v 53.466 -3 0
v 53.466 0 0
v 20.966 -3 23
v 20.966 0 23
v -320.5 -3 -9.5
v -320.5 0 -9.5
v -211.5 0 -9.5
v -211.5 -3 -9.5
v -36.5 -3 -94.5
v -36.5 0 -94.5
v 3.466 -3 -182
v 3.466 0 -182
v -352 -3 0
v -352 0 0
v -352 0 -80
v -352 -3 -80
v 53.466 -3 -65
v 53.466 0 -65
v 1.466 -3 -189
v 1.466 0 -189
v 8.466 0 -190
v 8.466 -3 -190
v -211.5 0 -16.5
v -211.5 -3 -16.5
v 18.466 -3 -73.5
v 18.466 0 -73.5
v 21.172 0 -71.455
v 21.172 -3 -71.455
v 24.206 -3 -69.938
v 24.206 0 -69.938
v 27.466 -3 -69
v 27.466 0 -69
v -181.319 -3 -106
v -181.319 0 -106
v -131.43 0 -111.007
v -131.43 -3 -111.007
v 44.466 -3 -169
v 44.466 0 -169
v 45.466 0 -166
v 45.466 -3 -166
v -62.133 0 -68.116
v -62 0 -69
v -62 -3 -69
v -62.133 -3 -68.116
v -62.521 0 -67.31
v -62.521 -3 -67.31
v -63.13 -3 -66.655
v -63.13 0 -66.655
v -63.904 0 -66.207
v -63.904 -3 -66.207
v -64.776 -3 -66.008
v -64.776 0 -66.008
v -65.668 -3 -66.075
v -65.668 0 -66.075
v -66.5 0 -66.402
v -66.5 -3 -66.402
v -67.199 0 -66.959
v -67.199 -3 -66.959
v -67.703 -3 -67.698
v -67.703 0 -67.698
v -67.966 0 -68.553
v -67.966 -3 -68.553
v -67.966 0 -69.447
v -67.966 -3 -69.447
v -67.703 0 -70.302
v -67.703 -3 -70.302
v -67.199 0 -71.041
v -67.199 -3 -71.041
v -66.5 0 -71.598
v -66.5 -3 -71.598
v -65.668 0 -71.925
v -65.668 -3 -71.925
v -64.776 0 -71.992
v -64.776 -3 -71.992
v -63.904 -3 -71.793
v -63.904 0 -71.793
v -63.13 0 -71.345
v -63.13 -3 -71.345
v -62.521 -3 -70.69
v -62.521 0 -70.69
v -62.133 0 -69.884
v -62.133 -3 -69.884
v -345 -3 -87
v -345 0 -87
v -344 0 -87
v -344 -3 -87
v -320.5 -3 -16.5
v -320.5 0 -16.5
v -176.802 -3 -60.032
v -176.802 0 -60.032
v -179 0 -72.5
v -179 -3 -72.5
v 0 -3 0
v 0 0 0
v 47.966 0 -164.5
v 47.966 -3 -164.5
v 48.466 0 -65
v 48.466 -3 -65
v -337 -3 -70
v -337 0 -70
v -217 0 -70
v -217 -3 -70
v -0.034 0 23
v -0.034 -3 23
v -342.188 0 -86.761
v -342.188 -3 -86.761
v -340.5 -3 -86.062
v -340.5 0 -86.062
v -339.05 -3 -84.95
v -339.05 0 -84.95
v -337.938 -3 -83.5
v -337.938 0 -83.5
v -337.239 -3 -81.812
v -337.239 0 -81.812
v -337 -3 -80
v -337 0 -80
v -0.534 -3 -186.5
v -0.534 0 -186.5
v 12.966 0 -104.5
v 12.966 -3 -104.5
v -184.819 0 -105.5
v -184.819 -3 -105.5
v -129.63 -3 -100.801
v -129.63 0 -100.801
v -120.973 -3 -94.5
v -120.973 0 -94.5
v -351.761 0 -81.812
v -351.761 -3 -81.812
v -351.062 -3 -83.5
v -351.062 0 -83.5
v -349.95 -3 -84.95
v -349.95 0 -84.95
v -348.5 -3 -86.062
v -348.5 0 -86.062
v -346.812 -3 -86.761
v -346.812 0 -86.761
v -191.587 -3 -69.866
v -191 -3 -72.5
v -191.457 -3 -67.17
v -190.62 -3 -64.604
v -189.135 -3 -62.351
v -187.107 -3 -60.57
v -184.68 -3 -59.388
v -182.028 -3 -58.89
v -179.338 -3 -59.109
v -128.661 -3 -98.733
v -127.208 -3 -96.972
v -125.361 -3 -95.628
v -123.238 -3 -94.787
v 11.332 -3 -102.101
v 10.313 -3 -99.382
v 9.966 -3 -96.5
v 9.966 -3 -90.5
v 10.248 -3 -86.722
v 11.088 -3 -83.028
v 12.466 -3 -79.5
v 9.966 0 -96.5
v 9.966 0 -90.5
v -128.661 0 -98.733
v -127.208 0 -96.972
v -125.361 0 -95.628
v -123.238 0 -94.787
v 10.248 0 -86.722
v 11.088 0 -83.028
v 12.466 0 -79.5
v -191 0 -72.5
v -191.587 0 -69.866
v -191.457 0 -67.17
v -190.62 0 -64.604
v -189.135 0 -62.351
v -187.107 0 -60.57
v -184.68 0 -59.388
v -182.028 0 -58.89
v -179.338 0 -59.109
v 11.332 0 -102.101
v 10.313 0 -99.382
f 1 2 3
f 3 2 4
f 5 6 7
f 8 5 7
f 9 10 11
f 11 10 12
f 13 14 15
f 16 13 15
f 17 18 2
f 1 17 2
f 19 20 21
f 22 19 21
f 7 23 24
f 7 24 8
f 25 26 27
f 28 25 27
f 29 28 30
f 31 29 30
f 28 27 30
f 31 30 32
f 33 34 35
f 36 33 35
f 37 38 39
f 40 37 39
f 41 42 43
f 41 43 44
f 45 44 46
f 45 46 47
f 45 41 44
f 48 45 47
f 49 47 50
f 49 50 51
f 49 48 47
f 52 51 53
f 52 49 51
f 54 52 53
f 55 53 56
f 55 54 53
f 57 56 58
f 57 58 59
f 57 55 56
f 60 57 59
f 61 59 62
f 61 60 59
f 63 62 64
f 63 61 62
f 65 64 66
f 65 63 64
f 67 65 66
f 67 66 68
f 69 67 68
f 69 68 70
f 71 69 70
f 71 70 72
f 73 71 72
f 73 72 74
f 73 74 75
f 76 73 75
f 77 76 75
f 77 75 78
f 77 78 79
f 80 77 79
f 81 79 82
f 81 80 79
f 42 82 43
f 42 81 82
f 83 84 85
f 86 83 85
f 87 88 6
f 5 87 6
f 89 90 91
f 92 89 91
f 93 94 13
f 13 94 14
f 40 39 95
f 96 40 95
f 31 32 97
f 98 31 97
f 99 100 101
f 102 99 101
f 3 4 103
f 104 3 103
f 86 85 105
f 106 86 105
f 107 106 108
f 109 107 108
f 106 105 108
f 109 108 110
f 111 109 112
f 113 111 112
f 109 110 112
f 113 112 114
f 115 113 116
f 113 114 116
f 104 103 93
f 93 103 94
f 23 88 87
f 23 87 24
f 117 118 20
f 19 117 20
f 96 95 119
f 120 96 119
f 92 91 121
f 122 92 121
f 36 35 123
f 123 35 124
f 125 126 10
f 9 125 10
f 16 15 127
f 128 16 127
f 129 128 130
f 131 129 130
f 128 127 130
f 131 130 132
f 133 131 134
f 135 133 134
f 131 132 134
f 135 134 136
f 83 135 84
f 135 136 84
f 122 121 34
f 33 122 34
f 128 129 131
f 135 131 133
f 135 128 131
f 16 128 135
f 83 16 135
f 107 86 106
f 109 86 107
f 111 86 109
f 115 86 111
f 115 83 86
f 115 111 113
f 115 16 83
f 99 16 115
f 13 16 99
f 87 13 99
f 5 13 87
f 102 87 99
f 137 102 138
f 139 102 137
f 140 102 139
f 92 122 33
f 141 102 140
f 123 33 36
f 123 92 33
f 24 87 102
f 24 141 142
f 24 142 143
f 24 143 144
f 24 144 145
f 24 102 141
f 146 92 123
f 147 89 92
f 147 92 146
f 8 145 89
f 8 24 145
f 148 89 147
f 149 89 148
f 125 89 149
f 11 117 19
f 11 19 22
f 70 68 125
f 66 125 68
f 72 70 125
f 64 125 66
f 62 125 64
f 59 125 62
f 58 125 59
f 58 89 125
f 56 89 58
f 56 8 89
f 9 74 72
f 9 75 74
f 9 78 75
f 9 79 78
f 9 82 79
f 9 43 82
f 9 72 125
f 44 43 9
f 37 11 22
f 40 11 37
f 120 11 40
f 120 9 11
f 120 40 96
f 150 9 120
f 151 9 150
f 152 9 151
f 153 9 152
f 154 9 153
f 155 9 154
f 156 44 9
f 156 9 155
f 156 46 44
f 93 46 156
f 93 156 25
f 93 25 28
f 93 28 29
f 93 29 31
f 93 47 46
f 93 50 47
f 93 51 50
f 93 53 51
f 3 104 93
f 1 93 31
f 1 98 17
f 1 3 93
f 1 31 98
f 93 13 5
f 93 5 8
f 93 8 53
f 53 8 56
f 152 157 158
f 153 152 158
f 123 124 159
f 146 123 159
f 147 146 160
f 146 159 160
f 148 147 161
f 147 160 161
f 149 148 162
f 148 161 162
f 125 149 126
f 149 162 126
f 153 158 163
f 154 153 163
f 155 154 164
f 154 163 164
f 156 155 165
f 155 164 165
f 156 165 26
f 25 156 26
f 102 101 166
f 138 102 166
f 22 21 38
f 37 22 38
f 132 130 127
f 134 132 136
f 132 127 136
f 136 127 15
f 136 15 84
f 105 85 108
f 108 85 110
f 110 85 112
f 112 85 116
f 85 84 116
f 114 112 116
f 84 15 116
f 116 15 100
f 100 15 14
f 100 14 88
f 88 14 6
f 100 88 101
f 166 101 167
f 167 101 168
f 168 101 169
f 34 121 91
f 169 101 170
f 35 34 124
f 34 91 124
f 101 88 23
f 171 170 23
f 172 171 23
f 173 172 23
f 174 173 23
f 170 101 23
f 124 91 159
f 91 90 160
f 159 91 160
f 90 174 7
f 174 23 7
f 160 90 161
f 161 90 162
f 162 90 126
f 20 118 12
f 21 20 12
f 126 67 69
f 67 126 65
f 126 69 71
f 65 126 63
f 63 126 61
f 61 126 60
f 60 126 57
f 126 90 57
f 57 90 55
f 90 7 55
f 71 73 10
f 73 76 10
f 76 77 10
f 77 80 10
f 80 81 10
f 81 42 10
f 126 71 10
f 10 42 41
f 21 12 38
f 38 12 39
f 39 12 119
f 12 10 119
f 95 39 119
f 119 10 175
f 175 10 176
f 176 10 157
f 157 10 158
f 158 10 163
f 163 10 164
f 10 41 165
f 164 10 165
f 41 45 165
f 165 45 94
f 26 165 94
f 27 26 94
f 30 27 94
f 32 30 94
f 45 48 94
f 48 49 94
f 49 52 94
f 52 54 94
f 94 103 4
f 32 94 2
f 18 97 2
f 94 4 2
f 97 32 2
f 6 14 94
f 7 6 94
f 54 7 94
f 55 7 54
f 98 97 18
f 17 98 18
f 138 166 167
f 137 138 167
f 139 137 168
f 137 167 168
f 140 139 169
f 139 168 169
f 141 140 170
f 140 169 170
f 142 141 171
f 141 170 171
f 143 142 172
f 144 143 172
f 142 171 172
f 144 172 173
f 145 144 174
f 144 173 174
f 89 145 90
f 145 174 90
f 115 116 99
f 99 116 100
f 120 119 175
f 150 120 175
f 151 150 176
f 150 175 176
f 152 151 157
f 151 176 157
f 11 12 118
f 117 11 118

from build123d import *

# Parameters (mm, degrees)
F0_W     = 109
F0_H     = 7
F0_R     = 3
F1_DEPTH = 3


# Not quite as in the source:
# - a feature names something its author has since deleted; it is built from what else it names


with BuildPart() as f1:
    # F0 (on Front) → F1 (new body)
    with BuildSketch(Plane.XZ):
        with BuildLine():
            Line((48.4662945779, -65), (53.4662945779, -65))
            Line((53.4662945779, -65), (53.4662945779, 0))
            Line((53.4662945779, 0), (20.9662945779, 22.9999753031))
            Line((20.9662945779, 22.9999753031), (-0.0337054221, 22.9999753031))
            Line((-0.0337054221, 22.9999753031), (0, 0))
            Line((0, 0), (-352, 0))
            Line((-352, 0), (-352, -39))
            Line((-352, -39), (-352, -55.5))
            Line((-352, -55.5), (-352, -80))
            ThreePointArc((-352, -80), (-349.9497474683, -84.9497474683), (-345, -87))
            Line((-345, -87), (-344, -87))
            ThreePointArc((-344, -87), (-339.0502525317, -84.9497474683), (-337, -80))
            Line((-337, -80), (-337, -70))
            Line((-337, -70), (-217, -70))
            Line((-217, -70), (-191, -72.5))
            ThreePointArc((-191, -72.5), (-188.1802970177, -61.3925278998), (-176.8015588718, -60.0320207981))
            Line((-176.8015588718, -60.0320207981), (-179, -72.5))
            Line((-179, -72.5), (-184.8187903634, -105.5))
            Line((-184.8187903634, -105.5), (-181.3187903634, -106))
            Line((-181.3187903634, -106), (-131.43, -111.007))
            Line((-131.43, -111.007), (-129.63038537, -100.8008782668))
            ThreePointArc((-129.63038537, -100.8008782668), (-126.3267144318, -96.2419842885), (-120.9729076822, -94.5))
            Line((-120.9729076822, -94.5), (-97.5, -94.5))
            Line((-97.5, -94.5), (-36.5, -94.5))
            Line((-36.5, -94.5), (3.4662945779, -182))
            Line((3.4662945779, -182), (-0.5337054221, -186.5))
            Line((-0.5337054221, -186.5), (1.4662945779, -189))
            Line((1.4662945779, -189), (8.4662945779, -190))
            Line((8.4662945779, -190), (44.4662945779, -169))
            Line((44.4662945779, -169), (45.4662945779, -166))
            Line((45.4662945779, -166), (47.9662945779, -164.5))
            Line((47.9662945779, -164.5), (12.9662945779, -104.5))
            ThreePointArc((12.9662945779, -104.5), (10.7409562508, -100.7720018727), (9.9662945779, -96.5))
            Line((9.9662945779, -96.5), (9.9662945779, -90.5))
            ThreePointArc((9.9662945779, -90.5), (10.599163398, -84.8597429137), (12.4662945779, -79.5))
            Line((12.4662945779, -79.5), (18.4662945779, -73.5))
            ThreePointArc((18.4662945779, -73.5), (22.6544664529, -70.6263437501), (27.4662945779, -69))
            Line((27.4662945779, -69), (48.4662945779, -65))
        make_face()
        with Locations((-266, -13)):
            Rectangle(F0_W, F0_H, mode=Mode.SUBTRACT)
        with Locations((-65, -69)):
            Circle(F0_R, mode=Mode.SUBTRACT)
    extrude(amount=F1_DEPTH)


solid = f1.part
